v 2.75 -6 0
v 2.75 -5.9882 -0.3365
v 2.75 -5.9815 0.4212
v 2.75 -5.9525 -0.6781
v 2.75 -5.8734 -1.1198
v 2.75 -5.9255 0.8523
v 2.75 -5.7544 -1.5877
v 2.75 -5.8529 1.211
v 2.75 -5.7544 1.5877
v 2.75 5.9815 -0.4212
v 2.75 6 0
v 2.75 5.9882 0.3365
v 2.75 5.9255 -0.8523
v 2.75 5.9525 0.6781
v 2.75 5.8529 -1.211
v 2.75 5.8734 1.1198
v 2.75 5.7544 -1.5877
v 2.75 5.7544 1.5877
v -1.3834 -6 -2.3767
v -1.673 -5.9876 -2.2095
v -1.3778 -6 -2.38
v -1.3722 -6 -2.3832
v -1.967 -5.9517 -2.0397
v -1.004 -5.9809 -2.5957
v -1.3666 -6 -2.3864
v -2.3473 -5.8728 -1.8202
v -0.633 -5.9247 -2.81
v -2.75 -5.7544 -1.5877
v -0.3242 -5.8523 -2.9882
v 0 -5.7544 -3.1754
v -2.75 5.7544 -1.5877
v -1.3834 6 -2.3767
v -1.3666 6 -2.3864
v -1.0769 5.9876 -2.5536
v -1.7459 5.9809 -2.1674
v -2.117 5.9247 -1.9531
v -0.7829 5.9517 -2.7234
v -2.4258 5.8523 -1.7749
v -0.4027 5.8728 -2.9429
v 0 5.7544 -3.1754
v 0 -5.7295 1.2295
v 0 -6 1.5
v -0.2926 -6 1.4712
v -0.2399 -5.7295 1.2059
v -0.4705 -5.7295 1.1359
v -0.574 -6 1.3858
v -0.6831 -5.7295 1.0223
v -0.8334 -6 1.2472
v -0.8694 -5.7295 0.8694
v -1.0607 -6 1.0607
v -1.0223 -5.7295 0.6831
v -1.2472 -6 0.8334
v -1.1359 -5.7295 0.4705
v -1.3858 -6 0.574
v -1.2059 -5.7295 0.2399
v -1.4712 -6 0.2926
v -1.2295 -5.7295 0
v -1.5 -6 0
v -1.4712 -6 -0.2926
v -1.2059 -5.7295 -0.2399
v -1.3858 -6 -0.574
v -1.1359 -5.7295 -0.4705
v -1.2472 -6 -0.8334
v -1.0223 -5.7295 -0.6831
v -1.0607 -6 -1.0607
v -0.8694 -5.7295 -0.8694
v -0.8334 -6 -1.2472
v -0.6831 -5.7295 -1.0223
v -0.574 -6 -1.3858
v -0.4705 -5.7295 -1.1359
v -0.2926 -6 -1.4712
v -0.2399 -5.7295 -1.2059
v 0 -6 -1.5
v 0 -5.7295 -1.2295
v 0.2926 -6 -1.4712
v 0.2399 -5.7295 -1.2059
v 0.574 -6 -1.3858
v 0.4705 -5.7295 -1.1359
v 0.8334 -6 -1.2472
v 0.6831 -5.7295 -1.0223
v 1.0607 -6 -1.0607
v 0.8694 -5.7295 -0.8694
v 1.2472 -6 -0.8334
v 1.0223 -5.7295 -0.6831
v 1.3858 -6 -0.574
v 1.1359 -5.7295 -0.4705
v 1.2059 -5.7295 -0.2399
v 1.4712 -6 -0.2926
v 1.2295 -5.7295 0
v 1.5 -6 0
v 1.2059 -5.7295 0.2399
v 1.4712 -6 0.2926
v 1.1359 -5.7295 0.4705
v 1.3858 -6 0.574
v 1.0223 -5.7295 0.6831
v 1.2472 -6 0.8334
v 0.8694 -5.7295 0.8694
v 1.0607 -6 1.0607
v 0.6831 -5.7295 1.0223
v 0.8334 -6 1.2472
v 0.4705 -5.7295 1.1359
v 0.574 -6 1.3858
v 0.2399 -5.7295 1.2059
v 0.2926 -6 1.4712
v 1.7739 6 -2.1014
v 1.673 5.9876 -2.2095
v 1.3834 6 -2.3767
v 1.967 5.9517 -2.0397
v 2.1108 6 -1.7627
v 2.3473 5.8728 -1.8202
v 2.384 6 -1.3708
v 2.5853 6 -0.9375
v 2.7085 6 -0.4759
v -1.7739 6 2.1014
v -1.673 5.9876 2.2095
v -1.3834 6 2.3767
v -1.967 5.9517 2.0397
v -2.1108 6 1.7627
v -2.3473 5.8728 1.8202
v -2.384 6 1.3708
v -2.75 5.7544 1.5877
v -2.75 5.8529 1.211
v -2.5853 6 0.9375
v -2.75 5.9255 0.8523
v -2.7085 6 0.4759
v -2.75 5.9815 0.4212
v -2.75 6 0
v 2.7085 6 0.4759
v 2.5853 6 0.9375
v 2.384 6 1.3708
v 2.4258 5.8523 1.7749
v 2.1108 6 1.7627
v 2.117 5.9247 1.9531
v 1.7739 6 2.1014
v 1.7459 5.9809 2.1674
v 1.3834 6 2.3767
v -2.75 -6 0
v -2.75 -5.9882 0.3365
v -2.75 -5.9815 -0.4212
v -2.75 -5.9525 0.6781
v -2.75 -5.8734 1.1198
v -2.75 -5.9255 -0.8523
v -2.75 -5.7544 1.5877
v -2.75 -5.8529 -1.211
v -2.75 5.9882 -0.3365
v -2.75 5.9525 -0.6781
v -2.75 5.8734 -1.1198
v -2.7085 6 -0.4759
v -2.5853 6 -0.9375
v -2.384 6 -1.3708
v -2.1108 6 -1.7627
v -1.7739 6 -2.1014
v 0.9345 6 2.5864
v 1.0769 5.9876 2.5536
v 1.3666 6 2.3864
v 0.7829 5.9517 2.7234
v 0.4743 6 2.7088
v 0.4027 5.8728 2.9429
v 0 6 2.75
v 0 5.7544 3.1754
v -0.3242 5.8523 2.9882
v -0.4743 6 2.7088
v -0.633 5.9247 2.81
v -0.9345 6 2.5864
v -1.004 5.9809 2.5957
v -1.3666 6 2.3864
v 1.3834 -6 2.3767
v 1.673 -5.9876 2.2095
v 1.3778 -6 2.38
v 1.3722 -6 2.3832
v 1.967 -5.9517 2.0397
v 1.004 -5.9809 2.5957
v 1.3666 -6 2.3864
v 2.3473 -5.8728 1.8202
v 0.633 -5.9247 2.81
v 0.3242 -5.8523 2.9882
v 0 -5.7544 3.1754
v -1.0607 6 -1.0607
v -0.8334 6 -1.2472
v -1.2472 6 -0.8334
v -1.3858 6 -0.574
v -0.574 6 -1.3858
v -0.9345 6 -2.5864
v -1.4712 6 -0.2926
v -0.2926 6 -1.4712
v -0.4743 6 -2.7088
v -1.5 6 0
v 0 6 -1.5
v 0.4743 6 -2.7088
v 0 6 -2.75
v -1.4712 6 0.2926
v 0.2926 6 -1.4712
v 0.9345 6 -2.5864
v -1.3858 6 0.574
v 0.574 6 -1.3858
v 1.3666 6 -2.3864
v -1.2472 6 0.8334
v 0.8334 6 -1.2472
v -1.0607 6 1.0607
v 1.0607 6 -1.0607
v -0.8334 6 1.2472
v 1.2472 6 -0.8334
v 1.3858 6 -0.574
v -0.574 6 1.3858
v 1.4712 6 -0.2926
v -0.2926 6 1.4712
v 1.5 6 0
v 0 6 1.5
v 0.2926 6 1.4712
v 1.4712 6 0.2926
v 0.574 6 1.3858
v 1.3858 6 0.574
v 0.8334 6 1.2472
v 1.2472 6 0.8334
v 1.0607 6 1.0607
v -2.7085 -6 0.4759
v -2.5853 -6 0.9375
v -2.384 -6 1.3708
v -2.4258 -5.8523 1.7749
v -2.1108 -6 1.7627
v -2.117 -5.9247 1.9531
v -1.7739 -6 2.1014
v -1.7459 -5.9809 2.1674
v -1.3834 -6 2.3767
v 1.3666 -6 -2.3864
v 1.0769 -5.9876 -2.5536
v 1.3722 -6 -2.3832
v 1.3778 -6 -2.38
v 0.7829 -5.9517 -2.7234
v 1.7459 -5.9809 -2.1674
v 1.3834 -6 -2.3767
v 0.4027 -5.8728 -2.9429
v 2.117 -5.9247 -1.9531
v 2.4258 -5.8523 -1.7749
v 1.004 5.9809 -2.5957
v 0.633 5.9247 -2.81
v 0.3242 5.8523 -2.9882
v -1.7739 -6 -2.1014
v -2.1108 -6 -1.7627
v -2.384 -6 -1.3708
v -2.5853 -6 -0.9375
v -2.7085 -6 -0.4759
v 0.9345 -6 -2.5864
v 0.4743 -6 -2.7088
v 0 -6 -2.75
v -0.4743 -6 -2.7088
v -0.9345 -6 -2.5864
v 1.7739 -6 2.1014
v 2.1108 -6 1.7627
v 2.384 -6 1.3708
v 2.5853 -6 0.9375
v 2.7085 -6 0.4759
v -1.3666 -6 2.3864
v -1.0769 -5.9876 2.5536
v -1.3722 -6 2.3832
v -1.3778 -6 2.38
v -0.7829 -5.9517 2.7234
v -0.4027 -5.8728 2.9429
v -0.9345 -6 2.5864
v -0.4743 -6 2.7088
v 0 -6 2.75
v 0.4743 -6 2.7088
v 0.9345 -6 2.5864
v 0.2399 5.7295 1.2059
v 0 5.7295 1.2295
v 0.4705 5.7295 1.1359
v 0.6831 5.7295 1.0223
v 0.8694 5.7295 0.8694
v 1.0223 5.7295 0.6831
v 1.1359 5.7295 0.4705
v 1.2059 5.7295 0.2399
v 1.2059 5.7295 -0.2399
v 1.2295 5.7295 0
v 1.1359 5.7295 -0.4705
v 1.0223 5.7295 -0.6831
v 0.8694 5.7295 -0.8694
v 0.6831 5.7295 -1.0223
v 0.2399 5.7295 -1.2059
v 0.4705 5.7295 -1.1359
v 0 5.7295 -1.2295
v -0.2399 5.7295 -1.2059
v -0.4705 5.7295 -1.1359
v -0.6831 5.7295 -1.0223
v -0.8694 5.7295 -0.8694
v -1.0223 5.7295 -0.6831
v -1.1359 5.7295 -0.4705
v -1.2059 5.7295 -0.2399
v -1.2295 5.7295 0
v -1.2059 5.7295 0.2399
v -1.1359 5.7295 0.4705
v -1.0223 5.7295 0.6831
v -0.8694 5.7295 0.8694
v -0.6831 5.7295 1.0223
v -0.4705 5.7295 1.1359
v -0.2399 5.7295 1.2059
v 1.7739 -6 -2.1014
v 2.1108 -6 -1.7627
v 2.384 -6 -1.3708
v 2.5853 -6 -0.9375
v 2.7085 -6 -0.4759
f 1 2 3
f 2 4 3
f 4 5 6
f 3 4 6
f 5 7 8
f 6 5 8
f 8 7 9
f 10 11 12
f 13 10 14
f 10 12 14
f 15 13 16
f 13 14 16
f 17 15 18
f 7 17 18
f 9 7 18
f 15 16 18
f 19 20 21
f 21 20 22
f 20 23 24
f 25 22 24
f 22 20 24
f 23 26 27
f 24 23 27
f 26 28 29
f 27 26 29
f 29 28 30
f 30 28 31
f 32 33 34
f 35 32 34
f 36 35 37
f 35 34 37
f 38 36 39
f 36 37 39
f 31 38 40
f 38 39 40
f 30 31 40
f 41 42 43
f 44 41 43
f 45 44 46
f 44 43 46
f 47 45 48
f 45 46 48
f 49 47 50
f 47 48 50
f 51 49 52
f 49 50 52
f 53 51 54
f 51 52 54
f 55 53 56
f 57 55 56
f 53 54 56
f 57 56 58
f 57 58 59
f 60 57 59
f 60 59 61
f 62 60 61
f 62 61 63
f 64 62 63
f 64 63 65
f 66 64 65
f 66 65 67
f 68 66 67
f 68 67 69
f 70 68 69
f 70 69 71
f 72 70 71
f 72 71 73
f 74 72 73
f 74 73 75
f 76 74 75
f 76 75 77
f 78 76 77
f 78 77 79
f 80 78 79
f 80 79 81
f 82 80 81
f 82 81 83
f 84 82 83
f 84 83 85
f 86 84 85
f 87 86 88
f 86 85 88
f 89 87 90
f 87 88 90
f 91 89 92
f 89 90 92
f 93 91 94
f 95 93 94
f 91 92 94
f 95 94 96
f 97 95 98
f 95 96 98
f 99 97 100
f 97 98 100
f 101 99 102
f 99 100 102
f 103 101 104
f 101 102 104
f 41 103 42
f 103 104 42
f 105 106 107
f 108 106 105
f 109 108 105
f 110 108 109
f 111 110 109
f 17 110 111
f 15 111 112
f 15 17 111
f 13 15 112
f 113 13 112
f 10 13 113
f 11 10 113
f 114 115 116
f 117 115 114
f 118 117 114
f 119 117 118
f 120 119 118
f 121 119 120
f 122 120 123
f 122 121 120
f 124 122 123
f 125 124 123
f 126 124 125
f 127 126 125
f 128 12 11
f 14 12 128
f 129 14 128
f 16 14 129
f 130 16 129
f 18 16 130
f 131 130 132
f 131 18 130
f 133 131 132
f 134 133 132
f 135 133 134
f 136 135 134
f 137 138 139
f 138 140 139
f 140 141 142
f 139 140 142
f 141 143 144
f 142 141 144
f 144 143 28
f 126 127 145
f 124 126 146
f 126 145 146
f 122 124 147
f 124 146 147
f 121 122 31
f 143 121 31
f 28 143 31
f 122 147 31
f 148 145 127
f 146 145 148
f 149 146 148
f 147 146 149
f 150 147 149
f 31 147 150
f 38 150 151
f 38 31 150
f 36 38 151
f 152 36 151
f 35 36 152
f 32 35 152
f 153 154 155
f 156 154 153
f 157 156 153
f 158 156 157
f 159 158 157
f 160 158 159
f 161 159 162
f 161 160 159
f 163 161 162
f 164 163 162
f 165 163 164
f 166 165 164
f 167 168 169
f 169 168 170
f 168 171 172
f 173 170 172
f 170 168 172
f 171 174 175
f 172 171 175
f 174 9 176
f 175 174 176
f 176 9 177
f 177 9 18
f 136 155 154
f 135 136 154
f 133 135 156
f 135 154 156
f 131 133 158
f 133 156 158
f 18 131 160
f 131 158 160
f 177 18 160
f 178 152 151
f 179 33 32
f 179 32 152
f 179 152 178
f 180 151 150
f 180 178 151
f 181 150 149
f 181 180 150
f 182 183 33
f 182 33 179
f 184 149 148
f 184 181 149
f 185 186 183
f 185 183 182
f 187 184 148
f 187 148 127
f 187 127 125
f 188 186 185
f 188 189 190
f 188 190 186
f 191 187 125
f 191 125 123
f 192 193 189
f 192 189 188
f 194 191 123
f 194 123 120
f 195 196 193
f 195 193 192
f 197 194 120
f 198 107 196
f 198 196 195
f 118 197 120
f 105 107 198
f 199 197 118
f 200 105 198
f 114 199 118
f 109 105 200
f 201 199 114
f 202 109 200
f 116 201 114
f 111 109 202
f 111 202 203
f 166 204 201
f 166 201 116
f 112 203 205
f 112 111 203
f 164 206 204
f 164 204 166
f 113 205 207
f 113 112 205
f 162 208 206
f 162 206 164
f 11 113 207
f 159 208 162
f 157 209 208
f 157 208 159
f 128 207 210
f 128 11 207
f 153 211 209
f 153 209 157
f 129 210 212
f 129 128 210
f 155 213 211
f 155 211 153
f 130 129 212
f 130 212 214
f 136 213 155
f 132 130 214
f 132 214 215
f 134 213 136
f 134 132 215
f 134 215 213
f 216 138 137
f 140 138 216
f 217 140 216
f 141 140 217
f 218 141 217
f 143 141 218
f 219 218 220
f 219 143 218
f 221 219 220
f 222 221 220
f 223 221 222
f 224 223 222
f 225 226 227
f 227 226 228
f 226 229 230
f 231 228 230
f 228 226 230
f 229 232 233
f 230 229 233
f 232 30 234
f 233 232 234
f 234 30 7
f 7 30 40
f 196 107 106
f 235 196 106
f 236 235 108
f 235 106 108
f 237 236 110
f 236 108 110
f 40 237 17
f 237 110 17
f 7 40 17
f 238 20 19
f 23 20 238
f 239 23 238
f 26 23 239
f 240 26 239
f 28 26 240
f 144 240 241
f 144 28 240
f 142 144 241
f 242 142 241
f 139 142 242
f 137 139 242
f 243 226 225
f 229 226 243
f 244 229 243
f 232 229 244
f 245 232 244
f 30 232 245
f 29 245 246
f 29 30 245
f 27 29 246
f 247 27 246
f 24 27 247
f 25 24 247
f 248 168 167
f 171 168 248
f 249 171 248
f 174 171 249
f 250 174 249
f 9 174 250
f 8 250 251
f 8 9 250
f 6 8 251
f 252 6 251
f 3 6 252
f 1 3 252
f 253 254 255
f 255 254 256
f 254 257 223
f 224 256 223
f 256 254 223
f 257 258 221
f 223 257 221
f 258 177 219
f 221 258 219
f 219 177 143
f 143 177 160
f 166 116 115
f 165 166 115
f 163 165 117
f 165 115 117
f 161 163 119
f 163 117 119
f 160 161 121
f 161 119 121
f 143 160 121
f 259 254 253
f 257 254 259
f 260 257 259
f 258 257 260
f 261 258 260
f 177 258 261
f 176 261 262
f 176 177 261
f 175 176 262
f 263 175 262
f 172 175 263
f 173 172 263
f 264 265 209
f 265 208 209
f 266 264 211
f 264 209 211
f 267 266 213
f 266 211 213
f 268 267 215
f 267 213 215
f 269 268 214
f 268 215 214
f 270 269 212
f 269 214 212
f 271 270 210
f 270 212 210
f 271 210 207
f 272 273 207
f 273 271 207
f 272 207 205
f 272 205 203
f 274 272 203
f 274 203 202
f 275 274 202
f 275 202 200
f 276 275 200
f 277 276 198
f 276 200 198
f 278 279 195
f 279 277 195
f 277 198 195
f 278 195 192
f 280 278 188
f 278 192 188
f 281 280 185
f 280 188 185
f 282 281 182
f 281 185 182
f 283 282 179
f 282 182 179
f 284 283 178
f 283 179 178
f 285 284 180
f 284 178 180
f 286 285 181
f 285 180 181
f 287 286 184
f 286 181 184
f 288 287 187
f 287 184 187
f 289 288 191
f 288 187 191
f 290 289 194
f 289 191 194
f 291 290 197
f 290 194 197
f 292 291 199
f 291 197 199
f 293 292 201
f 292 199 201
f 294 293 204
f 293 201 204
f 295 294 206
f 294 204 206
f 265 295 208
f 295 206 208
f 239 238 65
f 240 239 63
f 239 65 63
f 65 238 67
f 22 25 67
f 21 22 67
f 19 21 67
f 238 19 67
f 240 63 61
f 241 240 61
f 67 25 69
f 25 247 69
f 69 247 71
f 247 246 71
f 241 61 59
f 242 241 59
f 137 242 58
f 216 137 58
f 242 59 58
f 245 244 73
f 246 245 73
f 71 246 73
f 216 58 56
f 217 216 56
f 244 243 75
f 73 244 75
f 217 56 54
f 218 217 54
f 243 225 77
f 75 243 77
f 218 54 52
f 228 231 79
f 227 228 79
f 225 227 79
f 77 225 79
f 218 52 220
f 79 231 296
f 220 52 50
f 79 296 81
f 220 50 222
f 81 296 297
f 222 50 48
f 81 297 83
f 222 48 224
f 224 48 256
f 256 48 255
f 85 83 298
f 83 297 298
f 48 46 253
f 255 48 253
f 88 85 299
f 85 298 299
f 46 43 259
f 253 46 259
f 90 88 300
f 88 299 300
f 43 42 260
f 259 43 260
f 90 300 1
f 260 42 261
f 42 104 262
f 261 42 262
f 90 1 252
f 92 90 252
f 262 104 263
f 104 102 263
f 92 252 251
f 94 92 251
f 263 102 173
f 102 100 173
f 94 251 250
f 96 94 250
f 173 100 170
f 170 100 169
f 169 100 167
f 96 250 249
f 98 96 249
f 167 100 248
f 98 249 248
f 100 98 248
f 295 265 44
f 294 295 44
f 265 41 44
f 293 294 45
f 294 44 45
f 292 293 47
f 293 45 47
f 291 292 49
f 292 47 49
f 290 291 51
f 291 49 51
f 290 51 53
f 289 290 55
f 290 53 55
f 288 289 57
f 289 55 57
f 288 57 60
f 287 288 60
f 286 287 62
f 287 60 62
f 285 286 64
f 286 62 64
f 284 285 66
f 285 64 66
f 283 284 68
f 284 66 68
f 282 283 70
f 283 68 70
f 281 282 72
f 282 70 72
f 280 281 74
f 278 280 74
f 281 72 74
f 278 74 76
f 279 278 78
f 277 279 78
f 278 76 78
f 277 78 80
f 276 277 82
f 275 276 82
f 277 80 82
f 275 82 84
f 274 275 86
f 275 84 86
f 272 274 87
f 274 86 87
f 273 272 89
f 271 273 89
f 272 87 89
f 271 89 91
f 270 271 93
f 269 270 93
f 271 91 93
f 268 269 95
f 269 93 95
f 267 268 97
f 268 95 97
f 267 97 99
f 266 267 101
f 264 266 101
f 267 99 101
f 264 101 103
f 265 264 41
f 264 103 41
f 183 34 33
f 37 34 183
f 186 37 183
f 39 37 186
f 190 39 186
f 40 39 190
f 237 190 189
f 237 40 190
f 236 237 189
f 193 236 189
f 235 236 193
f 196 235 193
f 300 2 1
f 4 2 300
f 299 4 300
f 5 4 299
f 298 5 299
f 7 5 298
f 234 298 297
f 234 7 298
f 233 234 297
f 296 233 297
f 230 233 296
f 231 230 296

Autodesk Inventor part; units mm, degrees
ref_plane "YZ Plane" through (0, 0, 0) normal (1, 0, 0) x (0, 1, 0)
ref_plane "XZ Plane" through (0, 0, 0) normal (0, 1, 0) x (-1, 0, 0)
ref_plane "XY Plane" through (0, 0, 0) normal (0, 0, 1) x (1, 0, 0)
sketch "スケッチ1" plane through (0, 0, 0) normal (1, 0, 0) x (0, 1, 0)
  line L0 (-6, 0) -> (6, 0)
  line L1 (0, 0) -> (0, 3.1754) construction
  line L2 (-5.7544, 3.1754) -> (-6, 2.75)
  line L3 (-6, 2.75) -> (-6, 0)
  line L4 (-5.7544, 3.1754) -> (5.7544, 3.1754)
  line L5 (5.7544, 3.1754) -> (6, 2.75)
  line L6 (6, 2.75) -> (6, 0)
  dimension "d1" = 2.75
  dimension "d2" = 3.1754
  dimension "d3" = 30
  dimension "d4" = 12
revolve "回転1" add sketch "スケッチ1" angle 360 about axis through (0, -6, 0) along (0, 1, 0)
sketch "スケッチ2" plane through (0, 6, 0) normal (0, 1, 0) x (1, 0, 0)
  circle A0 centre (0, 0) radius 3.1754 projected
  line L0 (0, -3.1754) -> (-2.75, -1.5877)
  line L1 (-2.75, -1.5877) -> (-2.75, 1.5877)
  line L2 (-2.75, 1.5877) -> (0, 3.1754)
  line L3 (0, 3.1754) -> (2.75, 1.5877)
  line L4 (2.75, 1.5877) -> (2.75, -1.5877)
  line L5 (2.75, -1.5877) -> (0, -3.1754)
  point P0 (0, 0)
  point P1 (0, 0)
  point P2 (2.75, -1.5877)
  point P3 (2.75, -1.5877)
  point P4 (2.75, 1.5877)
  point P5 (2.75, 1.5877)
  point P6 (0, 3.1754)
  point P7 (0, 3.1754)
  point P8 (-2.75, 1.5877)
  point P9 (-2.75, 1.5877)
  point P10 (-2.75, -1.5877)
  point P11 (-2.75, -1.5877)
extrude "押し出し1" cut sketch "スケッチ2" against normal through all contours A0 L4 | L3 A0 | A0 L5 | L2 A0 | A0 L0 | L1 A0
hole "穴1" at (0, 6, 0) direction (0, -1, 0) diameter 2.459 end through all countersink diameter 3 countersink angle 90 thread size "M3x0.5" class "6H" standard "ISO Metric profile"
mirror "ミラー1" about plane through (0, 0, 0) normal (0, 1, 0) of "穴1"
equation "\"d2\" = 1.1547 * d1"
properties part number "ASL-312BE" material "アルミニウム 2014-T4"
